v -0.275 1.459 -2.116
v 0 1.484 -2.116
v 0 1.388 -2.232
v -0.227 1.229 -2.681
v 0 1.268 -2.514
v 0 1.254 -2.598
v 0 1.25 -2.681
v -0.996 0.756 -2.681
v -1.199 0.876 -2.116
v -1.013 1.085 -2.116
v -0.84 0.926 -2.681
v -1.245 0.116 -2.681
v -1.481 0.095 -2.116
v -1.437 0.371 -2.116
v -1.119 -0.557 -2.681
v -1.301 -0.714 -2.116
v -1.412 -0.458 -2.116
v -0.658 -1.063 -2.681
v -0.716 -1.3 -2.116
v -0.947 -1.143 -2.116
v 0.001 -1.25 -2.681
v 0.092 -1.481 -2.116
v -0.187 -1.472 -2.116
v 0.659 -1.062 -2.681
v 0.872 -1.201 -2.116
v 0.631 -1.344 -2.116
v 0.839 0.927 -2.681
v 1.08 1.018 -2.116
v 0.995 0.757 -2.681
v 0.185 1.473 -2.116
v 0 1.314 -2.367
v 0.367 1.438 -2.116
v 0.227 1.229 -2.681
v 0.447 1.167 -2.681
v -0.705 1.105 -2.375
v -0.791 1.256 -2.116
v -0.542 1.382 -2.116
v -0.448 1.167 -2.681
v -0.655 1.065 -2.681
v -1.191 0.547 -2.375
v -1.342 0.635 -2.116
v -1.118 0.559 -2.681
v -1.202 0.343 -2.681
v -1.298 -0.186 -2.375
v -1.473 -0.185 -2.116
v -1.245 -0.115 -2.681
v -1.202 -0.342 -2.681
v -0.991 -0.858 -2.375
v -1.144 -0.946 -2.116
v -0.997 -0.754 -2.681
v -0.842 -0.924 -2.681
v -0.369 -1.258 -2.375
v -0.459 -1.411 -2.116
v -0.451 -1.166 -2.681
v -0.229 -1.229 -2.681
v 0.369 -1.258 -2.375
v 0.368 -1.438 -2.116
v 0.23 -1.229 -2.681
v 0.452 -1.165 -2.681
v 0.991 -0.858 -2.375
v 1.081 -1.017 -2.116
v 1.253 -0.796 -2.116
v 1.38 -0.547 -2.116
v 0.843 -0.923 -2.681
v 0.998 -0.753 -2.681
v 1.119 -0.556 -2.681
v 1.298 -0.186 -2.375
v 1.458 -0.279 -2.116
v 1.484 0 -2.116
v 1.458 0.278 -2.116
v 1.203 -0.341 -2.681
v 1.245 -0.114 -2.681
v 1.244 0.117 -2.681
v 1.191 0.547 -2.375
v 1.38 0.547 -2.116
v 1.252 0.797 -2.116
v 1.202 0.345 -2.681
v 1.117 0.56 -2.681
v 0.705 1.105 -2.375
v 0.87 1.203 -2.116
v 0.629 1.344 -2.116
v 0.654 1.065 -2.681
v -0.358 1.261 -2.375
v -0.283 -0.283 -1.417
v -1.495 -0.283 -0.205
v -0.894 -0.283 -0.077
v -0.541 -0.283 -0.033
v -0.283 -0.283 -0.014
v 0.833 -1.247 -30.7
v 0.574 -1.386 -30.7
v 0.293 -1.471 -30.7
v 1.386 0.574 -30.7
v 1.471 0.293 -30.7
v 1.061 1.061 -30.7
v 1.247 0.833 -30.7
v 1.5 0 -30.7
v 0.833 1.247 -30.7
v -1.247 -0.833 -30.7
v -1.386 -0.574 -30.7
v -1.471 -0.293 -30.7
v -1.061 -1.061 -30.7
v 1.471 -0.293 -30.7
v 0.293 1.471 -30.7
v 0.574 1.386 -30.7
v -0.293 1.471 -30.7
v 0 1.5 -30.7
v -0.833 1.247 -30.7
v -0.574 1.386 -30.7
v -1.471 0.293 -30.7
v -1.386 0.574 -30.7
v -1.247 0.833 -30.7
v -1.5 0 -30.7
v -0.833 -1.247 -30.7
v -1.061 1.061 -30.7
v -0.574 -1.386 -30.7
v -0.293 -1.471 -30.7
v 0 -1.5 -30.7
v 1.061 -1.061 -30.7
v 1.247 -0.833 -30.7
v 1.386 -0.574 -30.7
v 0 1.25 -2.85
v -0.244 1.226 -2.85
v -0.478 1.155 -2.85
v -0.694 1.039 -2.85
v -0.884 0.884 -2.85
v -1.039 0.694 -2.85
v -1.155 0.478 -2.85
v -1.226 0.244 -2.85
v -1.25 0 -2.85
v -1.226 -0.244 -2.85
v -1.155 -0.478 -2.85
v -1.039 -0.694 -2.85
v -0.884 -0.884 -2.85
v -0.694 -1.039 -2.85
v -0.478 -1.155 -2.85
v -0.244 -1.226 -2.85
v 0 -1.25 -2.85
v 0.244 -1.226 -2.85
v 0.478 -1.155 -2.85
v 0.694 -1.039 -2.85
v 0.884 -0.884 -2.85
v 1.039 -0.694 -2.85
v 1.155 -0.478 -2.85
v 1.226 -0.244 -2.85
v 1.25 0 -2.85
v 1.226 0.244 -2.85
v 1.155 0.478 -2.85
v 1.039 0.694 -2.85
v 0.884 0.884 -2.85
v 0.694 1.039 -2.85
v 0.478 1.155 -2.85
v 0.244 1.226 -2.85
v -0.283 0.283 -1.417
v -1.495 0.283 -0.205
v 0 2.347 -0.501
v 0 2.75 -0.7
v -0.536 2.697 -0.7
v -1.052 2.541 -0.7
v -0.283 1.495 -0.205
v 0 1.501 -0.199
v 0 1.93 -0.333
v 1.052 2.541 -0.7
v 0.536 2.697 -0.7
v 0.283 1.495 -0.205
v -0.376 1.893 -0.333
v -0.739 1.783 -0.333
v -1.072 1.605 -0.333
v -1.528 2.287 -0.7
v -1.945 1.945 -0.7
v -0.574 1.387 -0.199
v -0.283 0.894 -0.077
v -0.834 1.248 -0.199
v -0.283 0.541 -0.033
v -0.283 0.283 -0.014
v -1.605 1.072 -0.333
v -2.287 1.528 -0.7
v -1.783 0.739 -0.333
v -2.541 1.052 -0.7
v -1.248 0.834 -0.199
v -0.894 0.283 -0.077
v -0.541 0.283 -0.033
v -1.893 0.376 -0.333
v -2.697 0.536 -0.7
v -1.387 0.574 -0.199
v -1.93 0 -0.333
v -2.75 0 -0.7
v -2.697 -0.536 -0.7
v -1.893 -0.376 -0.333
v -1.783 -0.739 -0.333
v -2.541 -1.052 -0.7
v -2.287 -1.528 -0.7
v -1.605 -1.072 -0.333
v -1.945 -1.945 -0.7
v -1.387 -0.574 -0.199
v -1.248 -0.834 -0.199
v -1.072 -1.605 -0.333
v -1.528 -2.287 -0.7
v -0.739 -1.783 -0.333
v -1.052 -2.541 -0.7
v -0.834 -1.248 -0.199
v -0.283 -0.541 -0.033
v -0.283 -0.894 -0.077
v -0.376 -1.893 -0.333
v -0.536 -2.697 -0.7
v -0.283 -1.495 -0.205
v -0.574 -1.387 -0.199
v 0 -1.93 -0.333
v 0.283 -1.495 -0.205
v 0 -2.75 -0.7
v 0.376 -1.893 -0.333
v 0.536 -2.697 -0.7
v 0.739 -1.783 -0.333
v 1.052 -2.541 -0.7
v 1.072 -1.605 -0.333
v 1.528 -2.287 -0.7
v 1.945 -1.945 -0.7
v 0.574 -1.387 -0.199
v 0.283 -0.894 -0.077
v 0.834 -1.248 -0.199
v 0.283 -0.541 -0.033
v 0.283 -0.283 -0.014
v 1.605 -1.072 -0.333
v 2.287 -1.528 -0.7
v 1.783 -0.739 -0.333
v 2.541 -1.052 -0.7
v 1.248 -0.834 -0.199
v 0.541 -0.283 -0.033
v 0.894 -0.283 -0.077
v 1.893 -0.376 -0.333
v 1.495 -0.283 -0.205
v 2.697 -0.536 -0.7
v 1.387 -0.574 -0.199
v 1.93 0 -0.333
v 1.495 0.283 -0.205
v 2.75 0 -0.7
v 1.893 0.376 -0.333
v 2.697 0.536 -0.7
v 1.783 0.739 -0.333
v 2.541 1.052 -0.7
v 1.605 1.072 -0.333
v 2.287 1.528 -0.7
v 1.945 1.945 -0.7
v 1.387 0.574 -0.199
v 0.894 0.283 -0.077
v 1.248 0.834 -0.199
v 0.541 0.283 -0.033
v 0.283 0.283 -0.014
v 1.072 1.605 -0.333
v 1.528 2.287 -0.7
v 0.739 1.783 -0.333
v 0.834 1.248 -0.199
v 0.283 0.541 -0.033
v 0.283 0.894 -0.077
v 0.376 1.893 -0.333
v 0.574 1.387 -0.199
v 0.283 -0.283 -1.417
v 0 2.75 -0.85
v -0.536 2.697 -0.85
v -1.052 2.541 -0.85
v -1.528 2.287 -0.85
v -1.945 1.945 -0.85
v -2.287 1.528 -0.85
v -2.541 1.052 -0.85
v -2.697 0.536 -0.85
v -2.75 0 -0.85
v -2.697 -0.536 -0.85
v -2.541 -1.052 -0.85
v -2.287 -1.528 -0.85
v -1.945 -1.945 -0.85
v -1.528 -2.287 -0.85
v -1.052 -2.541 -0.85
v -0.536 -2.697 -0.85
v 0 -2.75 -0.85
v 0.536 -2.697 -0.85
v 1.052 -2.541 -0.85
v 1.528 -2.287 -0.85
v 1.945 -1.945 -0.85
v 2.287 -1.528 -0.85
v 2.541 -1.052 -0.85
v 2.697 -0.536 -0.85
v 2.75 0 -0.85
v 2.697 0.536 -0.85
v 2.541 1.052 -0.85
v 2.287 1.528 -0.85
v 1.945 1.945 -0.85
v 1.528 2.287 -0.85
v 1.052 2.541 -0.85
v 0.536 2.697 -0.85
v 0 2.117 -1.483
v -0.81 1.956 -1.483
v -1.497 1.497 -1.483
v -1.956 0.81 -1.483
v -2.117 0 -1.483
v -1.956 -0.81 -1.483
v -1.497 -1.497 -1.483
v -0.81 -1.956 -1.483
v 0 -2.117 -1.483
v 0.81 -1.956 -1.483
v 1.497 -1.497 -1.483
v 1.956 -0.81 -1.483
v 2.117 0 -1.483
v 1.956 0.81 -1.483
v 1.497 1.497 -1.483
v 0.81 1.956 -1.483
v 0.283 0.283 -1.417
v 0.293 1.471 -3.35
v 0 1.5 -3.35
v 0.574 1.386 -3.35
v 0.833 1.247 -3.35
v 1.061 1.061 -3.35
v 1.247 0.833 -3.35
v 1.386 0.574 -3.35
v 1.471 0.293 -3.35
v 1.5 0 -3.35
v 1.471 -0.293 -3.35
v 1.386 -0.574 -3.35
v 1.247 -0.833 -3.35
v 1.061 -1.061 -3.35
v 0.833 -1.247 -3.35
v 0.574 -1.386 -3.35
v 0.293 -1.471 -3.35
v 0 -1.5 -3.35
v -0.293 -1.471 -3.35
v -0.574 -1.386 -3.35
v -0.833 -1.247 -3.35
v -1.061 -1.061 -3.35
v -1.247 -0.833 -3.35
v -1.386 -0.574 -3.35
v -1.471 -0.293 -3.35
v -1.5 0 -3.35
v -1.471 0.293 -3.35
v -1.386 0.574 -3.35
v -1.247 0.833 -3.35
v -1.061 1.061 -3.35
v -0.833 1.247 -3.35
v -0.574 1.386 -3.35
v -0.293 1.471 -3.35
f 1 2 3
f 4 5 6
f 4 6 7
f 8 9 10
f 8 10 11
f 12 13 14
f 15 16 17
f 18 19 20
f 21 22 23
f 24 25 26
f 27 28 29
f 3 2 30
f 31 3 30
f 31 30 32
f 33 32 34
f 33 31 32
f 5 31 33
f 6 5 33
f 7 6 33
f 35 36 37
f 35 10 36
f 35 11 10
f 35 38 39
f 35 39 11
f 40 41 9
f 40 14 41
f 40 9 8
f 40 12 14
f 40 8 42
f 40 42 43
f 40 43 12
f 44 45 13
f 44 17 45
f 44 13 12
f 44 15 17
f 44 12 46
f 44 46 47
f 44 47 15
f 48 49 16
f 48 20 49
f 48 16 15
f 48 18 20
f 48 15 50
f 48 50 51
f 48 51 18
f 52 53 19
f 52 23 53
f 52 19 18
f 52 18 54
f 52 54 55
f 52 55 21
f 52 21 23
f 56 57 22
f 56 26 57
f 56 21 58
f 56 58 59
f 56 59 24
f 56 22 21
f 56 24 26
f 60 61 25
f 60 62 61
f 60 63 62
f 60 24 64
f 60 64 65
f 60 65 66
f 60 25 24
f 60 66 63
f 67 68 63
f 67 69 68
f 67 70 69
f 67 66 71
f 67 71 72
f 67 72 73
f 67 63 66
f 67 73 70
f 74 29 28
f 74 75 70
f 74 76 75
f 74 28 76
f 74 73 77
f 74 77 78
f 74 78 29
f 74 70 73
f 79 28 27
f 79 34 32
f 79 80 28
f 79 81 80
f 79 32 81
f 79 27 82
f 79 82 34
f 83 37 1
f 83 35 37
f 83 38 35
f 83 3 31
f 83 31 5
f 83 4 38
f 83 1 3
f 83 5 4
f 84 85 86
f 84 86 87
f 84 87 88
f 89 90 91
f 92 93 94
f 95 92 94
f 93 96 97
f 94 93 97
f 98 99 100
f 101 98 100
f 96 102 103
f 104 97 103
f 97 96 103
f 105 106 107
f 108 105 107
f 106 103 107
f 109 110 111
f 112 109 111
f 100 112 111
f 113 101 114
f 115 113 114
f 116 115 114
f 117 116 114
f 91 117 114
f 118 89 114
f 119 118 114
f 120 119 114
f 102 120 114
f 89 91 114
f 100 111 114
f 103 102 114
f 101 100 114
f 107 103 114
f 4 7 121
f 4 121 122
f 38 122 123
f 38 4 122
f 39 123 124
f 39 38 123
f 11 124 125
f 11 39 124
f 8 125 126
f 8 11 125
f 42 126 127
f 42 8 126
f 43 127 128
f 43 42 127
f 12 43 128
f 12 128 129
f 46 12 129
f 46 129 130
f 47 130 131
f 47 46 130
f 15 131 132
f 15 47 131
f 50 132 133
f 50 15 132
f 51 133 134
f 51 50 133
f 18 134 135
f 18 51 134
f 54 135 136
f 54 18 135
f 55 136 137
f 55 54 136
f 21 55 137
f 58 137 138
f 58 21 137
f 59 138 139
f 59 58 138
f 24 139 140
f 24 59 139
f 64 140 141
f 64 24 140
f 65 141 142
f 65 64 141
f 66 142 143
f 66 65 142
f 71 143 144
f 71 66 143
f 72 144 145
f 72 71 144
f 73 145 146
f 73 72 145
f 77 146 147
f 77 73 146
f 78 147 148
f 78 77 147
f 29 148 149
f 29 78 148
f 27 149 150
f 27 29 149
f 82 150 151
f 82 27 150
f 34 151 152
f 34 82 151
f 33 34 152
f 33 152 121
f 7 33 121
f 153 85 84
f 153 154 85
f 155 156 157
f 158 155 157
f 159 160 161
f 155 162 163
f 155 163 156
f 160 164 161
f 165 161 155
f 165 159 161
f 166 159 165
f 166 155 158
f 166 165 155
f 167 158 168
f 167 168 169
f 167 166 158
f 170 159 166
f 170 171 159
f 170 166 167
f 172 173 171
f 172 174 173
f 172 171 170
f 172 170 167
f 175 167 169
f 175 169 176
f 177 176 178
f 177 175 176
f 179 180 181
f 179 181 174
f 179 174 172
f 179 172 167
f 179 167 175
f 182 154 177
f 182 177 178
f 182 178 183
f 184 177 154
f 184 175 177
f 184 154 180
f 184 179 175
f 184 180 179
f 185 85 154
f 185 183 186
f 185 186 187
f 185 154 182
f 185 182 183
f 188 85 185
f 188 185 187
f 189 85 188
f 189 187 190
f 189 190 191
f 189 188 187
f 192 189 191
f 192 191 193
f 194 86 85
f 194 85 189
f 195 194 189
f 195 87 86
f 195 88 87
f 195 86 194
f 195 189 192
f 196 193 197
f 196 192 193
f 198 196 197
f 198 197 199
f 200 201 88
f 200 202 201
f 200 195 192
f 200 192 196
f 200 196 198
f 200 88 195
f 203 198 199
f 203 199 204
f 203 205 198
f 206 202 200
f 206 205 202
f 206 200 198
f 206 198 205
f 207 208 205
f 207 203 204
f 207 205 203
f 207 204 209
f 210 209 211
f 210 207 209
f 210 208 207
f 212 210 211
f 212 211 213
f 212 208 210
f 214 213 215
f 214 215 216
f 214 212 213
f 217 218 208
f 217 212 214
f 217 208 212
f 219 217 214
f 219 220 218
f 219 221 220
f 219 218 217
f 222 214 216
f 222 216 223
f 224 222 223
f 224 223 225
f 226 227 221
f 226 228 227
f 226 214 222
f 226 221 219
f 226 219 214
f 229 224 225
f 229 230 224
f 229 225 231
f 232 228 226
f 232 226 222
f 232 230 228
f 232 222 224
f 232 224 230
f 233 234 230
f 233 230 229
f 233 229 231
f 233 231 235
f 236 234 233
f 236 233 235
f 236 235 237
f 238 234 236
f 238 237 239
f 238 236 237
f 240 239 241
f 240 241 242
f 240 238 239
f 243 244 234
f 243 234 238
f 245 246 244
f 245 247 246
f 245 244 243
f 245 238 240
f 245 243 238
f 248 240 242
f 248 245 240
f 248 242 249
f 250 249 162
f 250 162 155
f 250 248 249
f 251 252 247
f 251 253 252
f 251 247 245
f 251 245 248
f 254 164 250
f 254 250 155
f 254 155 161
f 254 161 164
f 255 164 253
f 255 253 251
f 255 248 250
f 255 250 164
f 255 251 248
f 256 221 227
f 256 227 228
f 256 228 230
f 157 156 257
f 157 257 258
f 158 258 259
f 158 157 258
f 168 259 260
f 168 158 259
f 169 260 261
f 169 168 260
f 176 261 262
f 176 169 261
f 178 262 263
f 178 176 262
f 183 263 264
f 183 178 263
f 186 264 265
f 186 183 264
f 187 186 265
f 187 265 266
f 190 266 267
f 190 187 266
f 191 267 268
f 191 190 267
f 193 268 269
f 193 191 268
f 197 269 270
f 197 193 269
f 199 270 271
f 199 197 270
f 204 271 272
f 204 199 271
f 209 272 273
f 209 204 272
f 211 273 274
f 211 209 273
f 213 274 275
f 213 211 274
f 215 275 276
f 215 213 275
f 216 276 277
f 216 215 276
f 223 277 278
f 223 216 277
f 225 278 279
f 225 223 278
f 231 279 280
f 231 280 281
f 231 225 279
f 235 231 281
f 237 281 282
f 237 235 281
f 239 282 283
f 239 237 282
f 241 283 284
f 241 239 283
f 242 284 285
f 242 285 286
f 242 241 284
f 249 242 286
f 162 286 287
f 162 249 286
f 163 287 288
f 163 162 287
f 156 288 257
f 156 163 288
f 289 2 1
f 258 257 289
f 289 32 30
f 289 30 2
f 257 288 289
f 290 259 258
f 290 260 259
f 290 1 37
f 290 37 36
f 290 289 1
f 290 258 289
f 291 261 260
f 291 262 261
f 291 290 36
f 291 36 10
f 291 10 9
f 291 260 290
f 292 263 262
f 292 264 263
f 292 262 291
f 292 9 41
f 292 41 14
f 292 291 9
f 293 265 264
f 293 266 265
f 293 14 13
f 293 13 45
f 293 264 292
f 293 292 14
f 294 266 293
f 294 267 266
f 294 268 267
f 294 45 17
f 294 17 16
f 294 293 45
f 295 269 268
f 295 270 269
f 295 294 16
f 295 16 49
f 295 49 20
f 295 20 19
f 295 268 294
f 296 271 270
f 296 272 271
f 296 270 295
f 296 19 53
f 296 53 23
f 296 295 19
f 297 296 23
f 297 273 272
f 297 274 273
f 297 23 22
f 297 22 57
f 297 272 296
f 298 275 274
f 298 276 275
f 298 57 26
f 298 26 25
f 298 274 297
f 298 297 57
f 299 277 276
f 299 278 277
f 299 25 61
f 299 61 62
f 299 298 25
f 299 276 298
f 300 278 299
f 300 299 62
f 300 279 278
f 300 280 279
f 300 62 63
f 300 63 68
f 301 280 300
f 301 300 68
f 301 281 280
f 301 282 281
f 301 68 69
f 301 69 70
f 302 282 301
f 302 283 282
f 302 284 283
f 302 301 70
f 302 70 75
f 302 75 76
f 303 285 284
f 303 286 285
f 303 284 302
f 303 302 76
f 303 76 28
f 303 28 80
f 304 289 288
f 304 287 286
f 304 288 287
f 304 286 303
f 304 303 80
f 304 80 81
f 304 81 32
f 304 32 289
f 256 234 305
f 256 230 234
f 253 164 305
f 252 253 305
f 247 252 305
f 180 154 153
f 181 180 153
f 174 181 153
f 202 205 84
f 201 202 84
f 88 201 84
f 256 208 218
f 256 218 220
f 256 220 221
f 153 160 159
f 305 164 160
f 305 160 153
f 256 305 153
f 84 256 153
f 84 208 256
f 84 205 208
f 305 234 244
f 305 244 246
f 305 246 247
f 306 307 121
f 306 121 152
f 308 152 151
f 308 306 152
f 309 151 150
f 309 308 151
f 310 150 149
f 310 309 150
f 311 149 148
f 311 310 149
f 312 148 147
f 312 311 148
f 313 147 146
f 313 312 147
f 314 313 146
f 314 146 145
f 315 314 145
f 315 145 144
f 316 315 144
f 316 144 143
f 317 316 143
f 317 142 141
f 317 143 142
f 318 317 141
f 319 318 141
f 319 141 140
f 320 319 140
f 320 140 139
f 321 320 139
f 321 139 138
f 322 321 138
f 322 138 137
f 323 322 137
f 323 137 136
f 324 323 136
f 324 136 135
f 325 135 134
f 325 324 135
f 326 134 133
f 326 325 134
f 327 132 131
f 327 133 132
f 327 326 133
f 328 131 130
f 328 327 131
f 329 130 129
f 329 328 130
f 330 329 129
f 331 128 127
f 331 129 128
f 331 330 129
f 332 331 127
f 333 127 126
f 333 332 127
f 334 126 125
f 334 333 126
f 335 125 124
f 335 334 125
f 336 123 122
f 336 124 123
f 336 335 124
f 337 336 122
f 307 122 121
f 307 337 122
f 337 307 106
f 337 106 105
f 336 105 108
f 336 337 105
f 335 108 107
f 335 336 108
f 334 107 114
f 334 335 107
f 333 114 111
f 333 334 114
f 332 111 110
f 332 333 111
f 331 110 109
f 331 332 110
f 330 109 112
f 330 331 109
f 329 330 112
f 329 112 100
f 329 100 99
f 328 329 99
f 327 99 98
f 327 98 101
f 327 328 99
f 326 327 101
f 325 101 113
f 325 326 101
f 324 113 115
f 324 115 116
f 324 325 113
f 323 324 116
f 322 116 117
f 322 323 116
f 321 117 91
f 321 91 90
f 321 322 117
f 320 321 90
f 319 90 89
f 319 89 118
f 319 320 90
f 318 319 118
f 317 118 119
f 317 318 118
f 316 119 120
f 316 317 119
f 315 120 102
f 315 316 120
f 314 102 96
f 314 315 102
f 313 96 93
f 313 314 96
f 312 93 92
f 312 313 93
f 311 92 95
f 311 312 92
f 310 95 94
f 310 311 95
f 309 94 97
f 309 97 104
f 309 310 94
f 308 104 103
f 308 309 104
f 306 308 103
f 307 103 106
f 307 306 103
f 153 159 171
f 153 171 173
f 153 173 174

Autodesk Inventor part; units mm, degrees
ref_plane "WorkPlane2" through (0, 0, 0) normal (0, 0, 1) x (1, 0, 0)
sketch "Sketch1" plane through (0, 0, 0) normal (1, 0, 0) x (0, 1, 0)
  point P0 (0, 0)
ref_plane "Work Plane2" through (0, 0, -2.35) normal (0, 0, 1) x (1, 0, 0)
ref_plane "WorkPlane3" through (0, 0, 7) normal (0, 0, 1) x (1, 0, 0)
sketch "Sketch2" plane through (0, 0, 0) normal (0, 1, 0) x (-1, 0, 0)
  point P0 (0, 0)
sketch "Sketch3" plane through (0, 0, 0) normal (1, 0, 0) x (0, 1, 0)
  line L0 (1.5, -3.35) -> (1.25, -2.85)
  line L1 (1.5, -30.7) -> (1.5, -3.35)
  line L2 (0, -30.7) -> (1.5, -30.7)
  line L3 (0, 0) -> (0, -30.7)
  arc A0 (2.75, -0.7) -> (0, 0) centre (0, -5.7518) ccw
  line L4 (2.75, -0.85) -> (2.75, -0.7)
  line L5 (1.25, -2.35) -> (2.75, -0.85)
  line L6 (1.25, -2.85) -> (1.25, -2.35)
  line L7 (0, -31.6445) -> (0, 31.6445) construction
  line L8 (0, -31.6445) -> (0, 31.6445)
  line L9 (0, -44.3023) -> (0, 44.3023) projected
  dimension "d2" = 1.5
  dimension "d4" = 1.25
  dimension "d6" = 0.5
  dimension "d8" = 1.65
  dimension "d10" = 135
  dimension "d12" = 2.75
  dimension "d14" = 0
  dimension "d16" = 0.7
  dimension "d18" = 30
  dimension "d22" = 27.35
revolve "Revolution1" add sketch "Sketch3" angle 360 about axis through (0, 0, -31.6445) along (0, 0, 1)
fillet "Fillet1" radius 0.8 1 edges at (0, -1.25, -2.35)
sketch "Sketch4" plane through (0, 0, 0) normal (0, 1, 0) x (-1, 0, 0)
  line L0 (0, 0) -> (-1.7, 0)
  line L1 (0, -1.4167) -> (0, 0)
  line L2 (-1.7, 0) -> (-0.2833, -1.4167)
  line L3 (0, -6.9021) -> (0, 1.1504) projected
  arc A0 (2.75, -0.7) -> (-2.75, -0.7) centre (0, -5.7518) ccw projected
  line L4 (0, -1.4167) -> (-0.2833, -1.4167)
  point P0 (0, -1.7)
  dimension "d30" = 45
  dimension "d33" = 3.4
  dimension "d34" = 0.2833
  dimension "d35" = 90
extrude "Extrusion1" cut sketch "Sketch4" along normal mid plane 0.5667
pattern_circular "PolarArray1" count 4 over 360 about axis through (0, 0, -10) along (0, 0, 1) of "Extrusion1"
thread "Thread1" size "M3x0.5" class "6g" standard "ISO Metric profile" full length
ref_plane "MSC_PF1" through (0, 0, 0) normal (1, 0, 0) x (0, 1, 0)
ref_plane "MSC_PT1" through (0, 2.75, -0.85) normal (0, 0, -1) x (-1, 0, 0)
equation "\"d2\" = 0.5 * NND"
equation "\"d4\" = 0.5 * msp_mdtds"
equation "\"d6\" = msp_x"
equation "\"d8\" = ParK"
equation "\"d12\" = 0.5 * Dk"
equation "\"d16\" = ParF"
equation "\"d18\" = NLG"
equation "\"d22\" = b"
equation "\"d24\" = r"
equation "\"d33\" = M"
equation "\"d34\" = 0.0833333 * M"
equation "\"d31\" = 0.166667 * M"
equation "\"d39\" = b"
equation "\"PTC\" = 0.5"
equation "\"msp_x\" = PTC"
equation "\"NLG\" = 30"
equation "\"NND\" = 3"
equation "\"ParK\" = 1.65"
equation "\"r\" = 0.8"
equation "\"msp_mdtds\" = NND - PTC"
equation "\"b\" = 27.35"
equation "\"Dk\" = 5.5"
equation "\"ParF\" = 0.7"
equation "\"M\" = 3.4"
equation "\"ParA\" = 1"
equation "\"THREADDIA\" = NND"
equation "\"TEMPLATE\" = 1.2345"
properties part number "ISO 7047 - M3x30 - 4.8 - H" material "Steel"
